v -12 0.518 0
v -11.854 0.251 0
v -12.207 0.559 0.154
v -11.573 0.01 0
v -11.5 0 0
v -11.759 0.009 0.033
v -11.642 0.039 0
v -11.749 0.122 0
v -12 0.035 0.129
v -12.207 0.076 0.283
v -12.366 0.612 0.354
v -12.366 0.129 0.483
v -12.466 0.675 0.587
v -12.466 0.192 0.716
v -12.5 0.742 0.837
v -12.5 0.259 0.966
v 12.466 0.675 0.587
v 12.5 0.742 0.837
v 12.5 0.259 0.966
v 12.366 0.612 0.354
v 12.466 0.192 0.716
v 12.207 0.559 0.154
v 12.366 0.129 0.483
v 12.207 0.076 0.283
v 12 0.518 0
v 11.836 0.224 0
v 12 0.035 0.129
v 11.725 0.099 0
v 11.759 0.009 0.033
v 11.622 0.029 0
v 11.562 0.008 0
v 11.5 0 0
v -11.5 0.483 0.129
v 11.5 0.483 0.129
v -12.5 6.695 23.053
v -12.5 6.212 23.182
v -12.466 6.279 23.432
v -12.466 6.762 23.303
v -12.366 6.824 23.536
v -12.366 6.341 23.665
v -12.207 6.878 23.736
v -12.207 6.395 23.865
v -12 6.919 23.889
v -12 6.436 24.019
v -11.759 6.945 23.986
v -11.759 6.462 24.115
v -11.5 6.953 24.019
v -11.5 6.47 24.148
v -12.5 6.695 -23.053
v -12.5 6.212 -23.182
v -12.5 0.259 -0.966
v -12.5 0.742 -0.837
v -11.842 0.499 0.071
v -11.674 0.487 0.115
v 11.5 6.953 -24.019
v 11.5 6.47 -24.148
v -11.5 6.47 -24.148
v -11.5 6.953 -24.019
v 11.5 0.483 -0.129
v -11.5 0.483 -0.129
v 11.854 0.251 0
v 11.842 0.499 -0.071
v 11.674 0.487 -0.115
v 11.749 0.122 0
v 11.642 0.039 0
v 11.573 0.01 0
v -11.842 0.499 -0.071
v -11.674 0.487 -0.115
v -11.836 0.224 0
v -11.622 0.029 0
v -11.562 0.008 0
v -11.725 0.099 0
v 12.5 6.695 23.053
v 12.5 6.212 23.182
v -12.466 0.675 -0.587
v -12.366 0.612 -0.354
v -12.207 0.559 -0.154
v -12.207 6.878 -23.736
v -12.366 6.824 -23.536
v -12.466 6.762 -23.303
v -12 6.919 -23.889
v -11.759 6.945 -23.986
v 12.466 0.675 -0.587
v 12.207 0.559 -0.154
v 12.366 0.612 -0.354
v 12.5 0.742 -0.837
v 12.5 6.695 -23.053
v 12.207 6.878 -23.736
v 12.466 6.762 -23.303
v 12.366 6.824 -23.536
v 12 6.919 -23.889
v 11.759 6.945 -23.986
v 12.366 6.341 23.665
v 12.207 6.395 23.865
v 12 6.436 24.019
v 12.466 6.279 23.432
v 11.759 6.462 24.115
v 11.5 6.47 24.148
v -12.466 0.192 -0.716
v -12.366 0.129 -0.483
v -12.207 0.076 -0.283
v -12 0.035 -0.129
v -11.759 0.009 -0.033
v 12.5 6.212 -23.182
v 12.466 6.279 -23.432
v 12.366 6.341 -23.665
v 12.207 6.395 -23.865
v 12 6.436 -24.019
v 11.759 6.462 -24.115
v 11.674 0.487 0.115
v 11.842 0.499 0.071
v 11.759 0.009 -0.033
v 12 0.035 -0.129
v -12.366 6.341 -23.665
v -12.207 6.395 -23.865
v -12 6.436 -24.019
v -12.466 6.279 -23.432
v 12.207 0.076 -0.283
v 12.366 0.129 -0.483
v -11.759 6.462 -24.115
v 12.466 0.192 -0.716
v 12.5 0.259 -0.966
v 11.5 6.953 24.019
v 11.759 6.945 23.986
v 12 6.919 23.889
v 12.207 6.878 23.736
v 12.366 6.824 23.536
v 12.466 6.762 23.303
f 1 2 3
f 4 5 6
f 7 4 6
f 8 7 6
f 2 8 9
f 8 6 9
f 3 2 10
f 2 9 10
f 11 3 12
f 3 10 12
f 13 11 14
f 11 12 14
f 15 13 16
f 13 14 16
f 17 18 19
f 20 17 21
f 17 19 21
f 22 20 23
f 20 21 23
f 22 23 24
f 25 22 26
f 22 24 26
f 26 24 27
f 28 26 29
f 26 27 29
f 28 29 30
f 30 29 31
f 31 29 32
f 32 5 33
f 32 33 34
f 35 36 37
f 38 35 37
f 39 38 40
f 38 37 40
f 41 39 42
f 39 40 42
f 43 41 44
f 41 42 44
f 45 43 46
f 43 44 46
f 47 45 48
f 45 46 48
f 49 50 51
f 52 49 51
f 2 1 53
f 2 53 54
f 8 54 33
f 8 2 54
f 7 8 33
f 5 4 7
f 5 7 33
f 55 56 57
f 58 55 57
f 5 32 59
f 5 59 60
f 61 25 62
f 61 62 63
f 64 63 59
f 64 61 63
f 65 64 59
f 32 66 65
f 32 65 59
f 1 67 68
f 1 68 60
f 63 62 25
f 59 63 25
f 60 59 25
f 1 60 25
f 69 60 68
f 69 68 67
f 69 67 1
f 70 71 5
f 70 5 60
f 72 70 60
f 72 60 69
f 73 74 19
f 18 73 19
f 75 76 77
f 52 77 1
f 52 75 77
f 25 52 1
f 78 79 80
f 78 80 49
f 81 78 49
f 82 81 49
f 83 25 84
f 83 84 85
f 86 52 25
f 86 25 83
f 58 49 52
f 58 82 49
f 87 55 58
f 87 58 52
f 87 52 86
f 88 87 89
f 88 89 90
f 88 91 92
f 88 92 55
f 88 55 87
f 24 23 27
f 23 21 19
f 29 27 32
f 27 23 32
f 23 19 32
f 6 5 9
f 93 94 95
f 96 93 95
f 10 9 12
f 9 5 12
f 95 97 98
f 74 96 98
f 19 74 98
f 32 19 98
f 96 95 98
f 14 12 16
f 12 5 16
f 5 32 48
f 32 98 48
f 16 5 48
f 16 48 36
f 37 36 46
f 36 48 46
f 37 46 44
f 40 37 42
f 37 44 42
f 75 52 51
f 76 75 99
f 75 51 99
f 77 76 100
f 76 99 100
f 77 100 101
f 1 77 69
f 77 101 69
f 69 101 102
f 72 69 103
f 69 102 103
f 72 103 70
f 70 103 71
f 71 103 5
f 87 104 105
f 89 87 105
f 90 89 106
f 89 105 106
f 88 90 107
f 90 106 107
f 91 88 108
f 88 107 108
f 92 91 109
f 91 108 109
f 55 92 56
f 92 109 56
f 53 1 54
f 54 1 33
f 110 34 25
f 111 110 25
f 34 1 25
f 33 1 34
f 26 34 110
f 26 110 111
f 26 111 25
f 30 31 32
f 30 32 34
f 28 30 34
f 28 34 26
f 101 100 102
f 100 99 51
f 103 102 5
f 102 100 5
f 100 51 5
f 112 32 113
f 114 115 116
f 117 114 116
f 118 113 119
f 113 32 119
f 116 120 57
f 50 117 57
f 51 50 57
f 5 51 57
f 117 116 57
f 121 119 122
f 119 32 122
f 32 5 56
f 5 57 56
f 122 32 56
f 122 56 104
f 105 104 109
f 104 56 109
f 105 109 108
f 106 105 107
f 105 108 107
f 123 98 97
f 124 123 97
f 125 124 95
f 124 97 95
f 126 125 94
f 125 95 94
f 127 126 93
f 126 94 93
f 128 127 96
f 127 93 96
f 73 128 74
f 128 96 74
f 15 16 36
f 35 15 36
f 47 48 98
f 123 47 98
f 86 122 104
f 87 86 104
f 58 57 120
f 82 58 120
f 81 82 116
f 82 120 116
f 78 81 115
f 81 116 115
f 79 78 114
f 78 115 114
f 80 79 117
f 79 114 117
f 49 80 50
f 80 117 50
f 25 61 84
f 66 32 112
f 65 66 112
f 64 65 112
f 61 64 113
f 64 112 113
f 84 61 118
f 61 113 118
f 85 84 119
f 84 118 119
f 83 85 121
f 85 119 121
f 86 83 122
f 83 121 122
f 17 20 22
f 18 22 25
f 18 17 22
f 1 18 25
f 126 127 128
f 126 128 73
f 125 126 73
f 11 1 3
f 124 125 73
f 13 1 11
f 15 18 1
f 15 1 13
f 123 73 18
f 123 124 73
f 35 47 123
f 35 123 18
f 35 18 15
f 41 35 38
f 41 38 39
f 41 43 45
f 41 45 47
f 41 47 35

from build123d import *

# Parameters (mm, degrees)
EXTRUDE_1_DEPTH          = 0.5
MOVE_BODY_1_ANGLE        = 15
PATTERN_CIRCULAR_1_COUNT = 2
OTHER_2_DEPTH            = 0.5
OTHER_2_2_DEPTH          = 0.5


# Read off the part's stored shape, not the designer's step: 相交2
with BuildPart() as part:
    # 草图1 → 凸台-拉伸1 (new body)
    with BuildSketch(Plane(origin=(0, 0, 0), x_dir=(1, 0, 0), z_dir=(0, 1, 0))):
        with BuildLine():
            Line((-11.5, 0), (11.5, 0))
            ThreePointArc((11.5, 0), (12.207106781, 0.292893219), (12.5, 1))
            Line((12.5, 1), (12.5, 24))
            ThreePointArc((12.5, 24), (12.207106781, 24.707106781), (11.5, 25))
            Line((11.5, 25), (-11.5, 25))
            ThreePointArc((-11.5, 25), (-12.207106781, 24.707106781), (-12.5, 24))
            Line((-12.5, 24), (-12.5, 1))
            ThreePointArc((-12.5, 1), (-12.207106781, 0.292893219), (-11.5, 0))
        make_face()
    extrude(amount=EXTRUDE_1_DEPTH)


with BuildPart() as part_1:
    # Move Body 1: moved
    add(part.part.rotate(Axis((0, 0, 0), (1, 0, 0)), MOVE_BODY_1_ANGLE))


with BuildPart() as pattern_circular_1_1:
    # 阵列(圆周)1: pattern copy
    add(part_1.part.rotate(Axis((0, 0, 0), (0, 1, 0)), 1 * 360 / PATTERN_CIRCULAR_1_COUNT))

    # 相交2 outline → 相交2 (cut)
    with BuildSketch(Plane(origin=(0, 0, 0), x_dir=(1, 0, 0), z_dir=(0, 0.9659258262890682, 0.2588190451025211))):
        with BuildLine():
            Line((-11.5, 0), (11.5, 0))
            ThreePointArc((11.5, 0), (11.758819045, 0.034074174), (12, 0.133974596))
            Line((12, 0.133974596), (13, 0.711324861))
            Line((13, 0.711324861), (13, 2))
            Line((13, 2), (-13, 2))
            Line((-13, 2), (-13, 0.711324861))
            Line((-13, 0.711324861), (-12, 0.133974596))
            ThreePointArc((-12, 0.133974596), (-11.758819045, 0.034074174), (-11.5, 0))
        make_face()
    extrude(amount=OTHER_2_DEPTH, mode=Mode.SUBTRACT)


with BuildPart() as part_2:
    add(part_1.part)

    # Other 2 2 outline → Other 2 2 (cut)
    with BuildSketch(Plane(origin=(0, 0, 0), x_dir=(1, 0, 0), z_dir=(0, 0.9659258262890682, -0.2588190451025211))):
        with BuildLine():
            Line((11.5, 0), (-11.5, 0))
            ThreePointArc((-11.5, 0), (-11.758819045, -0.034074174), (-12, -0.133974596))
            Line((-12, -0.133974596), (-13, -0.711324861))
            Line((-13, -0.711324861), (-13, -2))
            Line((-13, -2), (13, -2))
            Line((13, -2), (13, -0.711324861))
            Line((13, -0.711324861), (12, -0.133974596))
            ThreePointArc((12, -0.133974596), (11.758819045, -0.034074174), (11.5, 0))
        make_face()
    extrude(amount=OTHER_2_2_DEPTH, mode=Mode.SUBTRACT)


solid = Compound([pattern_circular_1_1.part, part_2.part])
